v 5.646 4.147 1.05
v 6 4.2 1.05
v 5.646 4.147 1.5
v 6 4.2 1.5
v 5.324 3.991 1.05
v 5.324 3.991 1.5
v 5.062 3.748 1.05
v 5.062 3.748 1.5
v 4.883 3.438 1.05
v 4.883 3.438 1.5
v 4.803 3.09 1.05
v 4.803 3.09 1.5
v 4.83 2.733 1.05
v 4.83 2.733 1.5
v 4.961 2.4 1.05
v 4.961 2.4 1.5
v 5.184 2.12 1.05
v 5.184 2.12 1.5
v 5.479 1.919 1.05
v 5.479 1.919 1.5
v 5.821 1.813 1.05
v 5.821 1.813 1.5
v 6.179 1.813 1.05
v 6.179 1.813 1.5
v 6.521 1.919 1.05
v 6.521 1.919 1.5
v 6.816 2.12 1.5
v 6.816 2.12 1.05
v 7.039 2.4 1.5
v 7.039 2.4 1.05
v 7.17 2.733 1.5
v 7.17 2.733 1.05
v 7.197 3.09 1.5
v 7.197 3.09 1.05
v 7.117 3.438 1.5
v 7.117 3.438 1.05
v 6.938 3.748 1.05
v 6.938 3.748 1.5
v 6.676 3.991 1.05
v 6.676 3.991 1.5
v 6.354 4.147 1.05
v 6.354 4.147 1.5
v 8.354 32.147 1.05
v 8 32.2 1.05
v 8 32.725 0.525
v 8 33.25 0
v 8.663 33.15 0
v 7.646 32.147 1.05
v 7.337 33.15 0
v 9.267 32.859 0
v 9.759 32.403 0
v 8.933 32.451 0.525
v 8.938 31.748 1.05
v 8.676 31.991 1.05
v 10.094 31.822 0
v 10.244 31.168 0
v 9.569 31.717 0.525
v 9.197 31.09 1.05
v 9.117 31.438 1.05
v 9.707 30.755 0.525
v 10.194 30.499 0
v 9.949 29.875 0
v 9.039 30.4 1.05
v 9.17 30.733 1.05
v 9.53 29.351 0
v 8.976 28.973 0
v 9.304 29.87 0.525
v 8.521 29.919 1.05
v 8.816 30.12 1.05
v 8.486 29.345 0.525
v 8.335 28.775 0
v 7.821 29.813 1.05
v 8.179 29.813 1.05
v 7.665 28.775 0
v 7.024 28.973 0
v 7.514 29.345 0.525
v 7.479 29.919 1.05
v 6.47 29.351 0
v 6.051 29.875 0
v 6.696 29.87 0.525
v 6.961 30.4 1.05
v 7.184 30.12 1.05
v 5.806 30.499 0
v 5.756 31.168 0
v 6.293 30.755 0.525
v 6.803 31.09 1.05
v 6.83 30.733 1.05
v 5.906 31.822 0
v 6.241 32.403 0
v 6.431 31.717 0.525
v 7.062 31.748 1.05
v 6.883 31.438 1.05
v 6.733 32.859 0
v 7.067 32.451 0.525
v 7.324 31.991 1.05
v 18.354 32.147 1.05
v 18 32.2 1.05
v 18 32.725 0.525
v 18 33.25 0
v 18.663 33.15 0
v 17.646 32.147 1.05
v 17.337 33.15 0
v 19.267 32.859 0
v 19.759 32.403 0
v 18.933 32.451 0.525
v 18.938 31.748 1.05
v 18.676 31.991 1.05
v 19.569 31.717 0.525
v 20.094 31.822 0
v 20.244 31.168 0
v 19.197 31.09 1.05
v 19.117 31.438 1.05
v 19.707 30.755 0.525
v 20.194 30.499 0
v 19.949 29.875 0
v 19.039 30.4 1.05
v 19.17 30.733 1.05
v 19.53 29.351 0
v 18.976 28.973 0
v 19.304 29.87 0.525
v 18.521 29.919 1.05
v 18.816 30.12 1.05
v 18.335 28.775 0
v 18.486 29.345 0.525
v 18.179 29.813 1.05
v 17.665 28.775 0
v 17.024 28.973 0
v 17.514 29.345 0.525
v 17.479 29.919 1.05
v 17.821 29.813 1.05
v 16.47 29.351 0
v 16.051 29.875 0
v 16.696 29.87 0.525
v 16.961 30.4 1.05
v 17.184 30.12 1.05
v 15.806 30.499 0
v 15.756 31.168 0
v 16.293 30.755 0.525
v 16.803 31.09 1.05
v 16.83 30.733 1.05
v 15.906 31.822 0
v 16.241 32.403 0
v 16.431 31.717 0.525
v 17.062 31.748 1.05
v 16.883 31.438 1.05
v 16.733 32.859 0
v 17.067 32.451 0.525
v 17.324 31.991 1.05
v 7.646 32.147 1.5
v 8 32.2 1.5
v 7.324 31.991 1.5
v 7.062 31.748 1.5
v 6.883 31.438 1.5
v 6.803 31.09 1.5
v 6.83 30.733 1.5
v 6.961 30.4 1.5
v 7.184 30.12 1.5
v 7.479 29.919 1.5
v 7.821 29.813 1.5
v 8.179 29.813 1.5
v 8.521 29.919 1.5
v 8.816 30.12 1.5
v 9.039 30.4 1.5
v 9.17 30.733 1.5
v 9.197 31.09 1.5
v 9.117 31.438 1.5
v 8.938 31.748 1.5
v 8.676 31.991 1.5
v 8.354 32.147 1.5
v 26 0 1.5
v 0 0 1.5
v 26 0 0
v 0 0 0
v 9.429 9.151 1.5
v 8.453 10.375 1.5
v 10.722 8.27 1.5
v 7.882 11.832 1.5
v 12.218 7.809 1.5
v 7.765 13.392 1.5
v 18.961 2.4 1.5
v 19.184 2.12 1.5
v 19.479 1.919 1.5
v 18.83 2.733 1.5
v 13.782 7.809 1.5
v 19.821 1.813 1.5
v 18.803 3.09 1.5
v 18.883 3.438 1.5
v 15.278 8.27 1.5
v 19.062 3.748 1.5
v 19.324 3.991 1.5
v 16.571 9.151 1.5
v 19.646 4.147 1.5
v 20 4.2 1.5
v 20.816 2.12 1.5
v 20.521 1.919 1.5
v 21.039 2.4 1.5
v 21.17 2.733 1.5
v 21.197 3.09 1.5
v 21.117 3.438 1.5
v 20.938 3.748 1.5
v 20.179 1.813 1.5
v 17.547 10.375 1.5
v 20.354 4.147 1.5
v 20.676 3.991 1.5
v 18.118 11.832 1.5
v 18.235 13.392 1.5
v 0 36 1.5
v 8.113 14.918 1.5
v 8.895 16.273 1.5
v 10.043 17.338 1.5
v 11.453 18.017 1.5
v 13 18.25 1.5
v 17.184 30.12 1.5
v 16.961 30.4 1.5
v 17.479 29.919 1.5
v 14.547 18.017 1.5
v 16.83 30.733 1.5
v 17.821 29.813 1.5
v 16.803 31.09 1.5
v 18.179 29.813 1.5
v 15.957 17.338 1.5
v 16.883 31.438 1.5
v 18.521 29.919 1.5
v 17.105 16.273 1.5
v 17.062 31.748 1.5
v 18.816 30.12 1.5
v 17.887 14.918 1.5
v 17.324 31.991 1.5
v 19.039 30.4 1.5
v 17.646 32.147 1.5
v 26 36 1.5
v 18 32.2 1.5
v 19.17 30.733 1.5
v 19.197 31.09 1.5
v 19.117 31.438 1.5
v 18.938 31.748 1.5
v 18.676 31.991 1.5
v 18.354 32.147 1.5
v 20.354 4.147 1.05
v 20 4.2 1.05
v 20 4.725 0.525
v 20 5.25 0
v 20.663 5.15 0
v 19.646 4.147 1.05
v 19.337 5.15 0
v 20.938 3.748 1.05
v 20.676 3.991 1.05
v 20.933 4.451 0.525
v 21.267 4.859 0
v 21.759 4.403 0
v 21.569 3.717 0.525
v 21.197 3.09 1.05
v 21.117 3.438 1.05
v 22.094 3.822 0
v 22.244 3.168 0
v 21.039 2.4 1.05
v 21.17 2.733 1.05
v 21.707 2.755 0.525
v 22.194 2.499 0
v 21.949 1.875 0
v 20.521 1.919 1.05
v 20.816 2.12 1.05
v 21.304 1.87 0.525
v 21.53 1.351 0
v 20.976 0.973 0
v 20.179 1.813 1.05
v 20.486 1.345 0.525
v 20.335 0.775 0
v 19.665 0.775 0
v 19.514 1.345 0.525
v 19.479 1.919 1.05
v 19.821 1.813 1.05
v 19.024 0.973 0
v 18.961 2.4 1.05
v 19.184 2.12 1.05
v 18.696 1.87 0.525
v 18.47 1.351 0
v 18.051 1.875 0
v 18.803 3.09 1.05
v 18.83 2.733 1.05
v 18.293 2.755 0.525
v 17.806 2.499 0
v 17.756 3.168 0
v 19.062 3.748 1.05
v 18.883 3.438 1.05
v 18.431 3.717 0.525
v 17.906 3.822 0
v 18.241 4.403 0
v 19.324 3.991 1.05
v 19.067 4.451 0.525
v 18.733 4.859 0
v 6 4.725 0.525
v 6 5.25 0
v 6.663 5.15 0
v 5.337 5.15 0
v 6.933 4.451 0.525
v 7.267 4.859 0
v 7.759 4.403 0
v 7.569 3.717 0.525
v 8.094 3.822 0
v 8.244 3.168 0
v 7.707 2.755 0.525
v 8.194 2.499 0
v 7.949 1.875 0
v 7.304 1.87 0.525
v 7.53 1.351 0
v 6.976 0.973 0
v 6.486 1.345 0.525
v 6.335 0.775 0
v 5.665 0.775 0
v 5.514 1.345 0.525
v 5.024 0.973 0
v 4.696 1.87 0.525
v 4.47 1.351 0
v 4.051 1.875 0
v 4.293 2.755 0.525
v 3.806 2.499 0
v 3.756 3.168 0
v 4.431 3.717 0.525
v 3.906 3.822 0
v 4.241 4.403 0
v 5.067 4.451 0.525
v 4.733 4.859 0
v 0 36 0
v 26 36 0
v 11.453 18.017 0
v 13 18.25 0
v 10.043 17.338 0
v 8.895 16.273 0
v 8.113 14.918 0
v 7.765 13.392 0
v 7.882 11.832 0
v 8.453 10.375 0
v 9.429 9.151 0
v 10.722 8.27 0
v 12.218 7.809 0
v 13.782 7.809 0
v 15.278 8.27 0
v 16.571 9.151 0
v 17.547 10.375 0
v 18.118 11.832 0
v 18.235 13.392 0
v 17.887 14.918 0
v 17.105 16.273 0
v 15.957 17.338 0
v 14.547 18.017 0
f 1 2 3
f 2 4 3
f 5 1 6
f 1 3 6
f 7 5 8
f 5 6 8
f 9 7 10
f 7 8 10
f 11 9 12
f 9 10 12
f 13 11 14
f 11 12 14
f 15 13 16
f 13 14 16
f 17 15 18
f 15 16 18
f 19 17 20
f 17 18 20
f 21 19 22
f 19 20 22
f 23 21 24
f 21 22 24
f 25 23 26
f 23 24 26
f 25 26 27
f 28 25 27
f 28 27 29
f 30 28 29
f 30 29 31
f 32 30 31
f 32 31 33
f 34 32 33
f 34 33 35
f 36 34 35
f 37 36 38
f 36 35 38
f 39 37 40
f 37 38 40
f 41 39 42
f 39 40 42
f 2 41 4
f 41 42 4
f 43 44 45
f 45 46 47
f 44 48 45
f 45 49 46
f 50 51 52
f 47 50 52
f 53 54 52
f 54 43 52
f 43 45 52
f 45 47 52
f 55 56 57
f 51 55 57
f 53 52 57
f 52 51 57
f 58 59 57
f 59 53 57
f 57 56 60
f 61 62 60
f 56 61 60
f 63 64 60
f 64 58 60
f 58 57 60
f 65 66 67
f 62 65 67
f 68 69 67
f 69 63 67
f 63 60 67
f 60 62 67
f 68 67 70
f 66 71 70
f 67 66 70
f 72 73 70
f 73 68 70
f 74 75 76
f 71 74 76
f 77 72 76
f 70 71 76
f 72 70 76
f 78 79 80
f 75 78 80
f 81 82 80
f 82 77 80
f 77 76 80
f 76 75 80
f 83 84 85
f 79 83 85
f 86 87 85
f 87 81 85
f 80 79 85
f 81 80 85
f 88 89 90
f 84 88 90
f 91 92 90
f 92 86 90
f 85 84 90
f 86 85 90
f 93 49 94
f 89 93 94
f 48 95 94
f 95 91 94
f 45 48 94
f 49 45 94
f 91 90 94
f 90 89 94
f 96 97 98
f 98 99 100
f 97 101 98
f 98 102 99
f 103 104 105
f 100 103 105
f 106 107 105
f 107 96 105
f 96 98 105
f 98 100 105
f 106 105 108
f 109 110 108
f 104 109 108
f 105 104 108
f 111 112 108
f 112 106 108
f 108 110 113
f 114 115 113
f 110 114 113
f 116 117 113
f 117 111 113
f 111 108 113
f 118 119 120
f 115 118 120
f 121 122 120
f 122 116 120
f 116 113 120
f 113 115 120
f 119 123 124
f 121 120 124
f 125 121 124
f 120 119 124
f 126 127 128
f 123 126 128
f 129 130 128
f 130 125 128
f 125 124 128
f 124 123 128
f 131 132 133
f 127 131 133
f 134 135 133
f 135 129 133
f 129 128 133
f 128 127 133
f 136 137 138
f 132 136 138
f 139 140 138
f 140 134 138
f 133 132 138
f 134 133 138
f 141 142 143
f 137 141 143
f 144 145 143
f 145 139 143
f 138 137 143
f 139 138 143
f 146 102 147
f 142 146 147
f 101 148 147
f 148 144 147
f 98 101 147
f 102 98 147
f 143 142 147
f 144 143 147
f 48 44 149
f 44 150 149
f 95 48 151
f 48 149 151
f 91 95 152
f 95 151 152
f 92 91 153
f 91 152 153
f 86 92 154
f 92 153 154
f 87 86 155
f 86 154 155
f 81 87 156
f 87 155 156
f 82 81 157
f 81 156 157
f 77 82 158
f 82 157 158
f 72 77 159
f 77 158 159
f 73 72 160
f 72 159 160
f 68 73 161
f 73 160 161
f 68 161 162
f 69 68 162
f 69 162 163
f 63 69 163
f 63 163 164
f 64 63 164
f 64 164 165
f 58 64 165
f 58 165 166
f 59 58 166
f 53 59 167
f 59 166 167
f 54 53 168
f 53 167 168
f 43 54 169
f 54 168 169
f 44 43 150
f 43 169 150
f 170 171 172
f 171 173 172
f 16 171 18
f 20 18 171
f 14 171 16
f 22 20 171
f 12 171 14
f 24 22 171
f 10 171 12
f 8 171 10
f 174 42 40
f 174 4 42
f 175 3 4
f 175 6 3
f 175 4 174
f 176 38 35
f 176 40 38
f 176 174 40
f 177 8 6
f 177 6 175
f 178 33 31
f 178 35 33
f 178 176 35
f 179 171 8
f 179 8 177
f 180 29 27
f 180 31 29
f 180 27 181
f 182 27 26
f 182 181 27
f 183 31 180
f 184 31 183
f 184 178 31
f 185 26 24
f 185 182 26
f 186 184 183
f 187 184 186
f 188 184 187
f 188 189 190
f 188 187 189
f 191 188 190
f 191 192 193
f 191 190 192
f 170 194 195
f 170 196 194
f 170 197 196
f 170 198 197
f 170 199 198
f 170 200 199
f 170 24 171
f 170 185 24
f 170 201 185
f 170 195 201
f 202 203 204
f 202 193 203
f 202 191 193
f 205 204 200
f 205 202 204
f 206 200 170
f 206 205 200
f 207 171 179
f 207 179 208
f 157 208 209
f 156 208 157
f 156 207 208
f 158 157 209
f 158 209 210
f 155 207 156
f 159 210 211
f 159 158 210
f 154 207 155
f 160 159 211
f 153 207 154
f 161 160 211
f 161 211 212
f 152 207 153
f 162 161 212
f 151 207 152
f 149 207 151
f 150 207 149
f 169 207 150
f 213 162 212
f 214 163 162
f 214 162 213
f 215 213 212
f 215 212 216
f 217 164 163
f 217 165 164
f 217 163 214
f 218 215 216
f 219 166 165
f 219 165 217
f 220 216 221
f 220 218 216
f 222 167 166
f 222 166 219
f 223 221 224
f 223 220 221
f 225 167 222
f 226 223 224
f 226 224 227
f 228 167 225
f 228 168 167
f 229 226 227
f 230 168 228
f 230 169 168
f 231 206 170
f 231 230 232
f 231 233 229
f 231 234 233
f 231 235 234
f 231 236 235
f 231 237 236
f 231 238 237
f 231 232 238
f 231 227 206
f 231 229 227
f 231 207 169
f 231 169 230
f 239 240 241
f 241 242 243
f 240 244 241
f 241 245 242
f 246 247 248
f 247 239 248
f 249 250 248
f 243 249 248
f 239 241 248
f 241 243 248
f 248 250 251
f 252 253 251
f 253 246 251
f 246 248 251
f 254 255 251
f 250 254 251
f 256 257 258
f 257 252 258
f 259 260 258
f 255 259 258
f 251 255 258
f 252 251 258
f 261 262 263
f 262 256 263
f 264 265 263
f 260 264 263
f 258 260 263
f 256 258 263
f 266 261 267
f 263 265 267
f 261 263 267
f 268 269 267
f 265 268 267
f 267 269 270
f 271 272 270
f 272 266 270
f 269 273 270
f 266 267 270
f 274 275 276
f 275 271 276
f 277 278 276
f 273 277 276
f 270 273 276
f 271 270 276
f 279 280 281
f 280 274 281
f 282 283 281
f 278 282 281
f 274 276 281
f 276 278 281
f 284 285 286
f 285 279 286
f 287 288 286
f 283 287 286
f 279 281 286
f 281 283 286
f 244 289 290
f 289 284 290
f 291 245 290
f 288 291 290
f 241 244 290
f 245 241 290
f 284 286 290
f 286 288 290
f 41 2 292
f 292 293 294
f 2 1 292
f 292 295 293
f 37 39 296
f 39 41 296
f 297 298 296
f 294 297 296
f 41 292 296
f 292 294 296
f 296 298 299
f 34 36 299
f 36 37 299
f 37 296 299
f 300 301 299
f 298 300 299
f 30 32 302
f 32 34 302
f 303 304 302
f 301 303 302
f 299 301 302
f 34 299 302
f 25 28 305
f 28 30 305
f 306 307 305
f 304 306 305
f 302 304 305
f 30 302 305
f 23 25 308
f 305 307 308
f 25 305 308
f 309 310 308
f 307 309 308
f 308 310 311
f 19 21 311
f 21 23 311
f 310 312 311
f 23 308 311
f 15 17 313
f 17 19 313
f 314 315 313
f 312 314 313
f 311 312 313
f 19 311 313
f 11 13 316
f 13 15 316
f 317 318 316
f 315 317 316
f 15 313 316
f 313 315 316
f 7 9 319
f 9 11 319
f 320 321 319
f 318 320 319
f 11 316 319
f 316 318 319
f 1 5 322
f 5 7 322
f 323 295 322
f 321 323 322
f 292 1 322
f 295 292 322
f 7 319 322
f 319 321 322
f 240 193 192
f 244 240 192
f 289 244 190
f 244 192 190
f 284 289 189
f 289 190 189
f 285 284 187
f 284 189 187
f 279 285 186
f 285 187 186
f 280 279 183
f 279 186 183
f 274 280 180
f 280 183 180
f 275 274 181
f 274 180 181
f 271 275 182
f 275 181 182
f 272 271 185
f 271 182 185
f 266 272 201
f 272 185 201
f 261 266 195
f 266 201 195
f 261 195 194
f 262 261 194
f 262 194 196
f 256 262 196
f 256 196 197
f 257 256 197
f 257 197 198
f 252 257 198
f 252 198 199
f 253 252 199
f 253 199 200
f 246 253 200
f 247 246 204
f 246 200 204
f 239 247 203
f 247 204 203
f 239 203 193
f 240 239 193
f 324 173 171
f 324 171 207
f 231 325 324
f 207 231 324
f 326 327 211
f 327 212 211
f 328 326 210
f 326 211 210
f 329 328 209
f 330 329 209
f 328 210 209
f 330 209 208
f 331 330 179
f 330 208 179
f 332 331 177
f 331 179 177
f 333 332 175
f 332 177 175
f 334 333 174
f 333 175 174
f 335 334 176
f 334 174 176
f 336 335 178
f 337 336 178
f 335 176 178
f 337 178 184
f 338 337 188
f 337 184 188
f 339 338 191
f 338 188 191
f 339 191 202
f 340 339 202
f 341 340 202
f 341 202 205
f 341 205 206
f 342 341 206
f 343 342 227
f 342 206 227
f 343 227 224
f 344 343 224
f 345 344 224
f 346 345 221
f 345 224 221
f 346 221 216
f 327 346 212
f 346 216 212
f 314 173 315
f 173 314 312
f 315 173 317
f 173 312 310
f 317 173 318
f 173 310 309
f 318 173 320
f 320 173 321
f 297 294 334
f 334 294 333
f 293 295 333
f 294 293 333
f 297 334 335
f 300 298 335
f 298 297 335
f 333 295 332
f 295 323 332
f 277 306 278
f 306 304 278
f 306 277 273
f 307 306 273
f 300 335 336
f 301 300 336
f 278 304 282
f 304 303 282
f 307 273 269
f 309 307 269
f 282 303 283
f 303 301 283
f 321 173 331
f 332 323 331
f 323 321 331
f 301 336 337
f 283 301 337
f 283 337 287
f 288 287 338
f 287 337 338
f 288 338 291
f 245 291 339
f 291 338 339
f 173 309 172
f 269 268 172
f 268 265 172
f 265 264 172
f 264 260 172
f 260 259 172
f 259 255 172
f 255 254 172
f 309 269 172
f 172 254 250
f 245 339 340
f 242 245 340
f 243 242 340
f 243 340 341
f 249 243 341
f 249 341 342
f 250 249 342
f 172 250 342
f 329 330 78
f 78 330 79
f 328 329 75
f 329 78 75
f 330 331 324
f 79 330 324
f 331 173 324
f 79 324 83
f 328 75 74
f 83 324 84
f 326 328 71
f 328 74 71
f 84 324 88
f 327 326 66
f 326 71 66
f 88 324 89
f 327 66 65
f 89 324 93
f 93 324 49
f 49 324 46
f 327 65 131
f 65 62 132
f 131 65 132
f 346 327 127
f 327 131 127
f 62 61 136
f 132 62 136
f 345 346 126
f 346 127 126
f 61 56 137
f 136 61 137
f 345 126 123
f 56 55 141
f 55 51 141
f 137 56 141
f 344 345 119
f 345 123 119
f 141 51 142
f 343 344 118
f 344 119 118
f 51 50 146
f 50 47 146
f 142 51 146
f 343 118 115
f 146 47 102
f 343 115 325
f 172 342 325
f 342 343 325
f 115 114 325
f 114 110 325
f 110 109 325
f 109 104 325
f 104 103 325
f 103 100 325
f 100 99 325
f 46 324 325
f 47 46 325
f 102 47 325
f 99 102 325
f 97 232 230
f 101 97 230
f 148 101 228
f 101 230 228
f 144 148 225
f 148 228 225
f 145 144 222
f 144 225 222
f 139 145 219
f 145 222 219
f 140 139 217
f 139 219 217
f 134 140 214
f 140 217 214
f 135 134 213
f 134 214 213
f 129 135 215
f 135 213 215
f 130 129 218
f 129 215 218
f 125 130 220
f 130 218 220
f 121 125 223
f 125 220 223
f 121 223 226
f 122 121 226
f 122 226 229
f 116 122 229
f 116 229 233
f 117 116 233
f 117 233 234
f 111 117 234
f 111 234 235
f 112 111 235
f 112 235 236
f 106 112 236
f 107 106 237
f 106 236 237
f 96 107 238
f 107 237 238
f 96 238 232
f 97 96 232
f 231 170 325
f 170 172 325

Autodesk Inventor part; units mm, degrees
ref_plane "YZ Plane" through (0, 0, 0) normal (1, 0, 0) x (0, 1, 0)
ref_plane "XZ Plane" through (0, 0, 0) normal (0, 1, 0) x (-1, 0, 0)
ref_plane "XY Plane" through (0, 0, 0) normal (0, 0, 1) x (1, 0, 0)
sketch "Skizze1" plane through (0, 0, 0) normal (0, 0, 1) x (1, 0, 0)
  line L0 (-5.2, 0) -> (31.2, 0) projected
  line L1 (0, -7.2) -> (0, 43.2) projected
  line L2 (0, 0) -> (26, 0)
  line L3 (26, 0) -> (26, 36)
  line L4 (26, 36) -> (0, 36)
  line L5 (0, 36) -> (0, 0)
  dimension "d0" = 36
  dimension "d1" = 26
extrude "Extrusion1" add sketch "Skizze1" along normal blind 1.5
sketch "Skizze2" plane through (0, 0, 0) normal (0, 0, -1) x (-1, 0, 0)
  circle A0 centre (-13, 13) radius 4.8 projected
hole "Bohrung1" at (13, 13, 0) direction (0, 0, 1) diameter 10.5 end through all
sketch "Skizze3" plane through (0, 0, 0) normal (0, 0, -1) x (-1, 0, 0)
  line L0 (0, 0) -> (-26, 0) projected
  line L1 (-26, 36) -> (0, 36) projected
  line L2 (-20, 31) -> (-6, 31)
  line L3 (-6, 31) -> (-6, 3)
  line L4 (-6, 3) -> (-20, 3)
  line L5 (-20, 3) -> (-20, 31)
  line L6 (-13, 36) -> (-13, 0)
  point P0 (-18, 31)
  point P1 (-8, 31)
  dimension "d11" = 28
  dimension "d12" = 14
  dimension "d20" = 3
  dimension "d21" = 10
hole "Bohrung2" at (18, 31, 0) at (8, 31, 0) at (20, 3, 0) at (6, 3, 0) direction (0, 0, 1) diameter 2.4 end through all countersink diameter 4.5 countersink angle 90
properties part number "13_1087_021"
